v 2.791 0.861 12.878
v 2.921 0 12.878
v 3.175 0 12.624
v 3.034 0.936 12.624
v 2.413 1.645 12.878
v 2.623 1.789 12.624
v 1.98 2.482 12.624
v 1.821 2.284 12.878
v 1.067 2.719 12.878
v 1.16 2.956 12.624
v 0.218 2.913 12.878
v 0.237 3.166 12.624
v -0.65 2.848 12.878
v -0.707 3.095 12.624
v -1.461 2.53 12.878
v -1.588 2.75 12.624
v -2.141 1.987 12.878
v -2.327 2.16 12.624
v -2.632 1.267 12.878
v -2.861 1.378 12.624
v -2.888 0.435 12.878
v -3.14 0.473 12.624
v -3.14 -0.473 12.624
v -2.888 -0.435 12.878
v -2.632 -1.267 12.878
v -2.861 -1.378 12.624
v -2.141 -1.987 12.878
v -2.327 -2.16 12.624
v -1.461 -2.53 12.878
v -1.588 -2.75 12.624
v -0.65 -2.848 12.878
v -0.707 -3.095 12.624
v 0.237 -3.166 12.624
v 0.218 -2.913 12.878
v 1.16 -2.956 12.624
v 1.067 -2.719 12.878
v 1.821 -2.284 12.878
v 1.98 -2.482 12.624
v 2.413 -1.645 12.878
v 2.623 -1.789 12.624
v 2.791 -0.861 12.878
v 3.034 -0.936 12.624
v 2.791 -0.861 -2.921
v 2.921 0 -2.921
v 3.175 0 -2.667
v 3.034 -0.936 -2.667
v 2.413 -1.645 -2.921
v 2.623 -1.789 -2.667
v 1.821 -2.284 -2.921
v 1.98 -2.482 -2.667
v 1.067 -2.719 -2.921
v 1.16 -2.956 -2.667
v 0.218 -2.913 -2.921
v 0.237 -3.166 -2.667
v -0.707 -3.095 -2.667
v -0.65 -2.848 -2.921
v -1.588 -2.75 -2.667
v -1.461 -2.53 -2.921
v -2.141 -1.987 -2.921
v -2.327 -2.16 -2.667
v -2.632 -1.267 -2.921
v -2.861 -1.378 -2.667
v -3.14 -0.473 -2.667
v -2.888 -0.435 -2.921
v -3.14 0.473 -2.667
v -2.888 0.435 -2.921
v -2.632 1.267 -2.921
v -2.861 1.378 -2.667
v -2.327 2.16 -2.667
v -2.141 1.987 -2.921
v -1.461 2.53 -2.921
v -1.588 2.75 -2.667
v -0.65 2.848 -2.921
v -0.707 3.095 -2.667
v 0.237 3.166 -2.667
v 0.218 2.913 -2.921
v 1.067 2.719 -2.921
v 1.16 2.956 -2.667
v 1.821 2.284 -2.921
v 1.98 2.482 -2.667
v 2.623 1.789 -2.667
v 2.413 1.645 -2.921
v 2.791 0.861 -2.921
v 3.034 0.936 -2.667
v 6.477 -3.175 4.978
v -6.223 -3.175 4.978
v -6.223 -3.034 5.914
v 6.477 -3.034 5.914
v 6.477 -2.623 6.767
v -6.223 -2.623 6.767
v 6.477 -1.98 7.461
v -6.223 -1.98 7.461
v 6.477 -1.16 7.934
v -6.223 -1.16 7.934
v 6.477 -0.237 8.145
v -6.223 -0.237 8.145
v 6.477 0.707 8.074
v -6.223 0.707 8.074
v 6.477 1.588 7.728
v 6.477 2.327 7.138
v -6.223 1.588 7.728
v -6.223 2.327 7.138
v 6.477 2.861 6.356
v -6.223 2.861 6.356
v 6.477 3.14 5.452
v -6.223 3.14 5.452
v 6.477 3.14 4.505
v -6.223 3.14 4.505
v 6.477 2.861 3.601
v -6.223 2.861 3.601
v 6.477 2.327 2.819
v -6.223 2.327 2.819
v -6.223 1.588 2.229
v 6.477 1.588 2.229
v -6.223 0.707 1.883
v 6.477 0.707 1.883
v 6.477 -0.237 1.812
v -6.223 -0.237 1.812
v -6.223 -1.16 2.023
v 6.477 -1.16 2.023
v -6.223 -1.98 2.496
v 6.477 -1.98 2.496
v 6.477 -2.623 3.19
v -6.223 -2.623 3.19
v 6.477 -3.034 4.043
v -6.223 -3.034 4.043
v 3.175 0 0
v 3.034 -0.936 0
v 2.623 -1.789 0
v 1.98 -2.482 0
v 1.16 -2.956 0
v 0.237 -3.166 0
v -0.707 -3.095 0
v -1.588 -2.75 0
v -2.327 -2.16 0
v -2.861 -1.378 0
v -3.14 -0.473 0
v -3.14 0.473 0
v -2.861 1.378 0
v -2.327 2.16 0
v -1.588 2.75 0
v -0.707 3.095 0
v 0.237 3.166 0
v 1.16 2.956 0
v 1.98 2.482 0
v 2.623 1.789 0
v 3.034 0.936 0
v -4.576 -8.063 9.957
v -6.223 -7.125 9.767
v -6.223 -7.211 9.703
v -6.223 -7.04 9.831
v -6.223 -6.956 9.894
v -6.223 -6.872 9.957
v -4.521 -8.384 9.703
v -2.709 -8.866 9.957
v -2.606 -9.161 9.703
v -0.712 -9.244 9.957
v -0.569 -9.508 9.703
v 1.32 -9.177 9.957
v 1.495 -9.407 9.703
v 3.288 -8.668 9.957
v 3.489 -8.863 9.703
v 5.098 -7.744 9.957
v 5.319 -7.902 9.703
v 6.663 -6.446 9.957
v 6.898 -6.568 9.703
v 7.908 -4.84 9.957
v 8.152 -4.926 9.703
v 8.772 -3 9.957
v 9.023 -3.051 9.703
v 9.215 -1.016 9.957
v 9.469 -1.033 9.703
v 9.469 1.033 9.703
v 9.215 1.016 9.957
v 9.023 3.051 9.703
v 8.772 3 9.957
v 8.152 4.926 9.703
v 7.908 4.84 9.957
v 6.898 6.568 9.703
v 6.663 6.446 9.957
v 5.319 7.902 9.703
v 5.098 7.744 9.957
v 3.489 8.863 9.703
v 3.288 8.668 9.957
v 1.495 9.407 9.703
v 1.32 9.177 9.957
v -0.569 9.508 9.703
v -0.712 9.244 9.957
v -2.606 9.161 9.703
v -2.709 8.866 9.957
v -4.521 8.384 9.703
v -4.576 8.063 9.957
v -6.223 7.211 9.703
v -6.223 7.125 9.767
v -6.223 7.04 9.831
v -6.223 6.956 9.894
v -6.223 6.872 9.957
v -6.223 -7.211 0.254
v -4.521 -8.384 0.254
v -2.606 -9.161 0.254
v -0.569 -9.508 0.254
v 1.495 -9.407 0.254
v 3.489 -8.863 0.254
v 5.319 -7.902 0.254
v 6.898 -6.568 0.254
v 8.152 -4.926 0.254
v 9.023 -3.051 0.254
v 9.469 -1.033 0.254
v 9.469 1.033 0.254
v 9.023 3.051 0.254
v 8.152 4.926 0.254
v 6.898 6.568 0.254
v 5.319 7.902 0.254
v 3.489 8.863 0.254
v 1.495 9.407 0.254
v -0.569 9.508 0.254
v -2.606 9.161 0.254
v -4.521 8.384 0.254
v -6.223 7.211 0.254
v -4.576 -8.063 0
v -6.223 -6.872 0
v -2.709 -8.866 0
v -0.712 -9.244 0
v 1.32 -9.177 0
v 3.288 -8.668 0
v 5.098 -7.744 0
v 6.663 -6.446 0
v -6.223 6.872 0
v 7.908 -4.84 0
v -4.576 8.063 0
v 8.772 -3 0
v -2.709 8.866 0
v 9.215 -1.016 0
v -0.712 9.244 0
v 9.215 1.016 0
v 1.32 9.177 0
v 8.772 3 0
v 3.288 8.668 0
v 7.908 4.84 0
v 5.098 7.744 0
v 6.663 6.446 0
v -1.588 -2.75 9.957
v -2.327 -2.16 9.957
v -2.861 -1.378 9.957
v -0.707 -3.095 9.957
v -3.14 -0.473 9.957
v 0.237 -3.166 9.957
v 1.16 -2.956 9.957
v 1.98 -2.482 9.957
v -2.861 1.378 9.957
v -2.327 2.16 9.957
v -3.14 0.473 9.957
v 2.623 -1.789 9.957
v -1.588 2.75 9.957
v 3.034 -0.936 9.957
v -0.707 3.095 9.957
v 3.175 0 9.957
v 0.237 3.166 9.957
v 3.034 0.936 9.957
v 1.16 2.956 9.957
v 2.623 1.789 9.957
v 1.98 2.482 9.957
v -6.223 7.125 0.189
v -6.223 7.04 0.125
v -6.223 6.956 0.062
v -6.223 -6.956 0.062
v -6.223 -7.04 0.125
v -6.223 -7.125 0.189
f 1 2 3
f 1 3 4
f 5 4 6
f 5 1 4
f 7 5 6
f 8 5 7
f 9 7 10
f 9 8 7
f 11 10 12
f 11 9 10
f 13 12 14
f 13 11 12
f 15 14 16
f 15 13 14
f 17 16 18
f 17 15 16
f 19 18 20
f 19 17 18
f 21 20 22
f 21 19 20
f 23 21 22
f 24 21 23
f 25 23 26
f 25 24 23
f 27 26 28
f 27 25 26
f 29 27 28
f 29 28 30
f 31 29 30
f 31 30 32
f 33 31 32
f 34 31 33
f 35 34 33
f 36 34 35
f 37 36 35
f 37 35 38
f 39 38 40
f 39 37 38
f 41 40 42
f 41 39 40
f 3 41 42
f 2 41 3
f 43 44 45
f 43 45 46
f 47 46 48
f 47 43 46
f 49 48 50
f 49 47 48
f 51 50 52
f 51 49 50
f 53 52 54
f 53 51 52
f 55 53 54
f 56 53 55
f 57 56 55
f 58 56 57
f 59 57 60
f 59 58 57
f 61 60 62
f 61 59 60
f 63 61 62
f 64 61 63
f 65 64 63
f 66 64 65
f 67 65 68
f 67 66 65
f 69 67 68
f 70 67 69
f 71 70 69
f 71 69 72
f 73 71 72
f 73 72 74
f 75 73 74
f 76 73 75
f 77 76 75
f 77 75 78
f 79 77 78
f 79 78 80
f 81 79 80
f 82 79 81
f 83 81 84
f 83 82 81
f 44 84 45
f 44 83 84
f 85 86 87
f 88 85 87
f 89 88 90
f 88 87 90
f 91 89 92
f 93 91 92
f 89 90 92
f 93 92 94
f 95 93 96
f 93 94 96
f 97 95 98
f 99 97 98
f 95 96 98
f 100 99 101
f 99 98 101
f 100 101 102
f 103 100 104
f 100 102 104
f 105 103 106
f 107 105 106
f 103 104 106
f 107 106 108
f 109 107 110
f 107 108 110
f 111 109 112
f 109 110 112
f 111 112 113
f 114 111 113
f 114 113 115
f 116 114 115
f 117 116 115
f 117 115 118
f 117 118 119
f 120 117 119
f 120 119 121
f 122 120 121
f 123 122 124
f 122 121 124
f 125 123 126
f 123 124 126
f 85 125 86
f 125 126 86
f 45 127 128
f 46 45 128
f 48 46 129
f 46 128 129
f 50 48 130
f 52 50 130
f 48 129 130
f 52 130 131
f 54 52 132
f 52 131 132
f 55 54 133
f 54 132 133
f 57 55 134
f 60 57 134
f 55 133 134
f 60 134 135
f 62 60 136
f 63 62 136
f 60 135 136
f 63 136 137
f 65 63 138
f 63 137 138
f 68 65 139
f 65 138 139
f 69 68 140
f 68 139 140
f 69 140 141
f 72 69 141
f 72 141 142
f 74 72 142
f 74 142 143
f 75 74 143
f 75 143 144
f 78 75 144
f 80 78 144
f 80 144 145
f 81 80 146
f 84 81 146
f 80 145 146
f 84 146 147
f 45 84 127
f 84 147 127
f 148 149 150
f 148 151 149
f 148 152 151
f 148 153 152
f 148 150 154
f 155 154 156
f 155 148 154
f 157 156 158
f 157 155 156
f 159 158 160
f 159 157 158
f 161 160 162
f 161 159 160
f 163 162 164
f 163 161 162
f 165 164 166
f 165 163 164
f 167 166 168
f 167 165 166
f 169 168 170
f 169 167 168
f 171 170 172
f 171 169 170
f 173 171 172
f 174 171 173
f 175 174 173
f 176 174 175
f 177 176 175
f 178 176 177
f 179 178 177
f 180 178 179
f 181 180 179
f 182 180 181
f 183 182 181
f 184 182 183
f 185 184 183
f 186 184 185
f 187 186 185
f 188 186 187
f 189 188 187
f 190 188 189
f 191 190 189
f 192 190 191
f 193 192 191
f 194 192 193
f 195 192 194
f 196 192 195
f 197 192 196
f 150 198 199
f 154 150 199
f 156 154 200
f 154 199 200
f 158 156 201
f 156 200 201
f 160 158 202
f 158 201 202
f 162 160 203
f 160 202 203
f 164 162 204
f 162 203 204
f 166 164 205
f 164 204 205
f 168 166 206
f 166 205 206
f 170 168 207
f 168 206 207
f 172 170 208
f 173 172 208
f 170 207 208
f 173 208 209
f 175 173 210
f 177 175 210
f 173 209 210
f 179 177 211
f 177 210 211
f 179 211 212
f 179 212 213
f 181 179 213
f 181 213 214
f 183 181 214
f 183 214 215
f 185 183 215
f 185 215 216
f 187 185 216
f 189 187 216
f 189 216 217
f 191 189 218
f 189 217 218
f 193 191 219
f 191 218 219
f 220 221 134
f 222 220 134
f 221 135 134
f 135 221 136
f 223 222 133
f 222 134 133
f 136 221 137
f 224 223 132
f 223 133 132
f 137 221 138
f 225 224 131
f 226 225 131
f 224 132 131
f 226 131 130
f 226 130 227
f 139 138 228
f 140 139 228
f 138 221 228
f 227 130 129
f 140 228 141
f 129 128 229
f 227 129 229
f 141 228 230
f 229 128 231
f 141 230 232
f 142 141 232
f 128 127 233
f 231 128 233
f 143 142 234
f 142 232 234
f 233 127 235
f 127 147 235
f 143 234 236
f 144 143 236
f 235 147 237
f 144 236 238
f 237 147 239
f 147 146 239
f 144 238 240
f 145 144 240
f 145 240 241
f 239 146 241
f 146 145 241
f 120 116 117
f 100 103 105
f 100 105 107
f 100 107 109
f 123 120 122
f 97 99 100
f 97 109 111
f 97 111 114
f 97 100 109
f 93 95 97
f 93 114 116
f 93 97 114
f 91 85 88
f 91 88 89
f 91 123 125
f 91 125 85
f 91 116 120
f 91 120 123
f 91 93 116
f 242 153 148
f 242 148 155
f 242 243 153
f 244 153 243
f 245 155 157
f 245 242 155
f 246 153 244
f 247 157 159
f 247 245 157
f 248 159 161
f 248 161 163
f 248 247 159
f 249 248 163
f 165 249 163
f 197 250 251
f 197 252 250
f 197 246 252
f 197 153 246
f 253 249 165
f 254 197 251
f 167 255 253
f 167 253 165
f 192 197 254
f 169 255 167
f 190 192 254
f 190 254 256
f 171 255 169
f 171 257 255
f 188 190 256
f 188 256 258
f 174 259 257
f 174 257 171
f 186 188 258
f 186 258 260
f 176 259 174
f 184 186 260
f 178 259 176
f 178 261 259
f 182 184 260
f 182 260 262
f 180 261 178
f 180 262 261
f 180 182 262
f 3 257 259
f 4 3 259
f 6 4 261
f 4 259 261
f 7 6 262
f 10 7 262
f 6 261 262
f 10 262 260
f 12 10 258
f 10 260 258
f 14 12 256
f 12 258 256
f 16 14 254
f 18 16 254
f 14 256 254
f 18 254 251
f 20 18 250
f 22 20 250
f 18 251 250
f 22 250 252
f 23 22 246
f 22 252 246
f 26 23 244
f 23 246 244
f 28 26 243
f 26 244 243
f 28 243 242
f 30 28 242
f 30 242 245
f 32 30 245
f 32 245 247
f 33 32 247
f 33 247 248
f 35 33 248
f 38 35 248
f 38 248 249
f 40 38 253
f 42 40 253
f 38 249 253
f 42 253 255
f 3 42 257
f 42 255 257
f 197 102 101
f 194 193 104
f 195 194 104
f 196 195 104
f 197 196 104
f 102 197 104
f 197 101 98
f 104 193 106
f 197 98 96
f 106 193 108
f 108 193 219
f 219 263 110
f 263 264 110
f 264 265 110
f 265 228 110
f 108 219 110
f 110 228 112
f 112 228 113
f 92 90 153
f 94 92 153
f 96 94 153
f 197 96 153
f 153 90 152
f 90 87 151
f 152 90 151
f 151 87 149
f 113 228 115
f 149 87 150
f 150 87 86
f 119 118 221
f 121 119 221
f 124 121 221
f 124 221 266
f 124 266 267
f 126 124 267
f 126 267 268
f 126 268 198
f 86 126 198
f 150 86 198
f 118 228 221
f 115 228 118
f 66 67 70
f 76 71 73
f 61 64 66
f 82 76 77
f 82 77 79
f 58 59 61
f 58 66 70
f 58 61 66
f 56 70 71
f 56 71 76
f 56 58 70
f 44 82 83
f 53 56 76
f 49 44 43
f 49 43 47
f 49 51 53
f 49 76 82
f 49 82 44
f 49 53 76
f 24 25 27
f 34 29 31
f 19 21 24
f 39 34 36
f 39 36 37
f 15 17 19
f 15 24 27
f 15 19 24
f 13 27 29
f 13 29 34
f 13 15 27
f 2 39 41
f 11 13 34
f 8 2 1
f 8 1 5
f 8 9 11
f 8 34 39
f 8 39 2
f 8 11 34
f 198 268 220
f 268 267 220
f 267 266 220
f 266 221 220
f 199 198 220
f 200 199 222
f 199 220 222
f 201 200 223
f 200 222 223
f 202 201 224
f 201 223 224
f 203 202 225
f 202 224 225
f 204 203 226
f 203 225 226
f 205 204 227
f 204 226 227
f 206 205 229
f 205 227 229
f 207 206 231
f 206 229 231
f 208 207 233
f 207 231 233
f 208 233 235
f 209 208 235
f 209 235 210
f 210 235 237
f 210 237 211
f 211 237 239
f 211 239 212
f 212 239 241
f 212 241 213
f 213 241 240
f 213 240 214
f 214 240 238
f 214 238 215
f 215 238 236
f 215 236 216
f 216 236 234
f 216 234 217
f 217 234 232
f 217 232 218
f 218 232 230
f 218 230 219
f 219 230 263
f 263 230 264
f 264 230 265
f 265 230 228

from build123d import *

# Parameters (mm, degrees)
F1_DEPTH = 9.9568
F2_R     = 3.175
F3_DEPTH = 2.921
F4_R     = 3.175
F5_DEPTH = 2.921
F6_R     = 3.175
F7_DEPTH = 12.7
F8_SIZE  = 0.254


with BuildPart() as f1:
    # F0 (on Top) → F1 (new body)
    with BuildSketch(Plane.XY):
        with BuildLine():
            Line((-6.223, 7.211095), (-6.223, -7.211095))
            ThreePointArc((-6.223, -7.211095), (9.525, 0), (-6.223, 7.211095))
        make_face()
    extrude(amount=F1_DEPTH)

    # F2 (on face) → F3 (join)
    with BuildSketch(Plane(origin=(0, 0, 0), x_dir=(1, 0, 0), z_dir=(0, 0, -1))):
        Circle(F2_R)
    extrude(amount=F3_DEPTH)

    # F4 (on face) → F5 (join)
    with BuildSketch(Plane.XY.offset(9.9568)):
        Circle(F4_R)
    extrude(amount=F5_DEPTH)

    # F6 (on face) → F7 (cut)
    with BuildSketch(Plane(origin=(-6.223, 0, 0), x_dir=(0, -1, 0), z_dir=(-1, 0, 0))):
        with Locations((0, 4.9784)):
            Circle(F6_R)
    extrude(amount=-F7_DEPTH, mode=Mode.SUBTRACT)

    # F8
    f8_edges = [f1.edges().sort_by_distance(p)[0] for p in [
        (-3.175, 0, -2.921),
        (9.525, 0, 9.9568),
        (9.525, 0, 0),
        (-3.175, 0, 12.8778),
    ]]
    chamfer(f8_edges, length=F8_SIZE)


solid = f1.part
